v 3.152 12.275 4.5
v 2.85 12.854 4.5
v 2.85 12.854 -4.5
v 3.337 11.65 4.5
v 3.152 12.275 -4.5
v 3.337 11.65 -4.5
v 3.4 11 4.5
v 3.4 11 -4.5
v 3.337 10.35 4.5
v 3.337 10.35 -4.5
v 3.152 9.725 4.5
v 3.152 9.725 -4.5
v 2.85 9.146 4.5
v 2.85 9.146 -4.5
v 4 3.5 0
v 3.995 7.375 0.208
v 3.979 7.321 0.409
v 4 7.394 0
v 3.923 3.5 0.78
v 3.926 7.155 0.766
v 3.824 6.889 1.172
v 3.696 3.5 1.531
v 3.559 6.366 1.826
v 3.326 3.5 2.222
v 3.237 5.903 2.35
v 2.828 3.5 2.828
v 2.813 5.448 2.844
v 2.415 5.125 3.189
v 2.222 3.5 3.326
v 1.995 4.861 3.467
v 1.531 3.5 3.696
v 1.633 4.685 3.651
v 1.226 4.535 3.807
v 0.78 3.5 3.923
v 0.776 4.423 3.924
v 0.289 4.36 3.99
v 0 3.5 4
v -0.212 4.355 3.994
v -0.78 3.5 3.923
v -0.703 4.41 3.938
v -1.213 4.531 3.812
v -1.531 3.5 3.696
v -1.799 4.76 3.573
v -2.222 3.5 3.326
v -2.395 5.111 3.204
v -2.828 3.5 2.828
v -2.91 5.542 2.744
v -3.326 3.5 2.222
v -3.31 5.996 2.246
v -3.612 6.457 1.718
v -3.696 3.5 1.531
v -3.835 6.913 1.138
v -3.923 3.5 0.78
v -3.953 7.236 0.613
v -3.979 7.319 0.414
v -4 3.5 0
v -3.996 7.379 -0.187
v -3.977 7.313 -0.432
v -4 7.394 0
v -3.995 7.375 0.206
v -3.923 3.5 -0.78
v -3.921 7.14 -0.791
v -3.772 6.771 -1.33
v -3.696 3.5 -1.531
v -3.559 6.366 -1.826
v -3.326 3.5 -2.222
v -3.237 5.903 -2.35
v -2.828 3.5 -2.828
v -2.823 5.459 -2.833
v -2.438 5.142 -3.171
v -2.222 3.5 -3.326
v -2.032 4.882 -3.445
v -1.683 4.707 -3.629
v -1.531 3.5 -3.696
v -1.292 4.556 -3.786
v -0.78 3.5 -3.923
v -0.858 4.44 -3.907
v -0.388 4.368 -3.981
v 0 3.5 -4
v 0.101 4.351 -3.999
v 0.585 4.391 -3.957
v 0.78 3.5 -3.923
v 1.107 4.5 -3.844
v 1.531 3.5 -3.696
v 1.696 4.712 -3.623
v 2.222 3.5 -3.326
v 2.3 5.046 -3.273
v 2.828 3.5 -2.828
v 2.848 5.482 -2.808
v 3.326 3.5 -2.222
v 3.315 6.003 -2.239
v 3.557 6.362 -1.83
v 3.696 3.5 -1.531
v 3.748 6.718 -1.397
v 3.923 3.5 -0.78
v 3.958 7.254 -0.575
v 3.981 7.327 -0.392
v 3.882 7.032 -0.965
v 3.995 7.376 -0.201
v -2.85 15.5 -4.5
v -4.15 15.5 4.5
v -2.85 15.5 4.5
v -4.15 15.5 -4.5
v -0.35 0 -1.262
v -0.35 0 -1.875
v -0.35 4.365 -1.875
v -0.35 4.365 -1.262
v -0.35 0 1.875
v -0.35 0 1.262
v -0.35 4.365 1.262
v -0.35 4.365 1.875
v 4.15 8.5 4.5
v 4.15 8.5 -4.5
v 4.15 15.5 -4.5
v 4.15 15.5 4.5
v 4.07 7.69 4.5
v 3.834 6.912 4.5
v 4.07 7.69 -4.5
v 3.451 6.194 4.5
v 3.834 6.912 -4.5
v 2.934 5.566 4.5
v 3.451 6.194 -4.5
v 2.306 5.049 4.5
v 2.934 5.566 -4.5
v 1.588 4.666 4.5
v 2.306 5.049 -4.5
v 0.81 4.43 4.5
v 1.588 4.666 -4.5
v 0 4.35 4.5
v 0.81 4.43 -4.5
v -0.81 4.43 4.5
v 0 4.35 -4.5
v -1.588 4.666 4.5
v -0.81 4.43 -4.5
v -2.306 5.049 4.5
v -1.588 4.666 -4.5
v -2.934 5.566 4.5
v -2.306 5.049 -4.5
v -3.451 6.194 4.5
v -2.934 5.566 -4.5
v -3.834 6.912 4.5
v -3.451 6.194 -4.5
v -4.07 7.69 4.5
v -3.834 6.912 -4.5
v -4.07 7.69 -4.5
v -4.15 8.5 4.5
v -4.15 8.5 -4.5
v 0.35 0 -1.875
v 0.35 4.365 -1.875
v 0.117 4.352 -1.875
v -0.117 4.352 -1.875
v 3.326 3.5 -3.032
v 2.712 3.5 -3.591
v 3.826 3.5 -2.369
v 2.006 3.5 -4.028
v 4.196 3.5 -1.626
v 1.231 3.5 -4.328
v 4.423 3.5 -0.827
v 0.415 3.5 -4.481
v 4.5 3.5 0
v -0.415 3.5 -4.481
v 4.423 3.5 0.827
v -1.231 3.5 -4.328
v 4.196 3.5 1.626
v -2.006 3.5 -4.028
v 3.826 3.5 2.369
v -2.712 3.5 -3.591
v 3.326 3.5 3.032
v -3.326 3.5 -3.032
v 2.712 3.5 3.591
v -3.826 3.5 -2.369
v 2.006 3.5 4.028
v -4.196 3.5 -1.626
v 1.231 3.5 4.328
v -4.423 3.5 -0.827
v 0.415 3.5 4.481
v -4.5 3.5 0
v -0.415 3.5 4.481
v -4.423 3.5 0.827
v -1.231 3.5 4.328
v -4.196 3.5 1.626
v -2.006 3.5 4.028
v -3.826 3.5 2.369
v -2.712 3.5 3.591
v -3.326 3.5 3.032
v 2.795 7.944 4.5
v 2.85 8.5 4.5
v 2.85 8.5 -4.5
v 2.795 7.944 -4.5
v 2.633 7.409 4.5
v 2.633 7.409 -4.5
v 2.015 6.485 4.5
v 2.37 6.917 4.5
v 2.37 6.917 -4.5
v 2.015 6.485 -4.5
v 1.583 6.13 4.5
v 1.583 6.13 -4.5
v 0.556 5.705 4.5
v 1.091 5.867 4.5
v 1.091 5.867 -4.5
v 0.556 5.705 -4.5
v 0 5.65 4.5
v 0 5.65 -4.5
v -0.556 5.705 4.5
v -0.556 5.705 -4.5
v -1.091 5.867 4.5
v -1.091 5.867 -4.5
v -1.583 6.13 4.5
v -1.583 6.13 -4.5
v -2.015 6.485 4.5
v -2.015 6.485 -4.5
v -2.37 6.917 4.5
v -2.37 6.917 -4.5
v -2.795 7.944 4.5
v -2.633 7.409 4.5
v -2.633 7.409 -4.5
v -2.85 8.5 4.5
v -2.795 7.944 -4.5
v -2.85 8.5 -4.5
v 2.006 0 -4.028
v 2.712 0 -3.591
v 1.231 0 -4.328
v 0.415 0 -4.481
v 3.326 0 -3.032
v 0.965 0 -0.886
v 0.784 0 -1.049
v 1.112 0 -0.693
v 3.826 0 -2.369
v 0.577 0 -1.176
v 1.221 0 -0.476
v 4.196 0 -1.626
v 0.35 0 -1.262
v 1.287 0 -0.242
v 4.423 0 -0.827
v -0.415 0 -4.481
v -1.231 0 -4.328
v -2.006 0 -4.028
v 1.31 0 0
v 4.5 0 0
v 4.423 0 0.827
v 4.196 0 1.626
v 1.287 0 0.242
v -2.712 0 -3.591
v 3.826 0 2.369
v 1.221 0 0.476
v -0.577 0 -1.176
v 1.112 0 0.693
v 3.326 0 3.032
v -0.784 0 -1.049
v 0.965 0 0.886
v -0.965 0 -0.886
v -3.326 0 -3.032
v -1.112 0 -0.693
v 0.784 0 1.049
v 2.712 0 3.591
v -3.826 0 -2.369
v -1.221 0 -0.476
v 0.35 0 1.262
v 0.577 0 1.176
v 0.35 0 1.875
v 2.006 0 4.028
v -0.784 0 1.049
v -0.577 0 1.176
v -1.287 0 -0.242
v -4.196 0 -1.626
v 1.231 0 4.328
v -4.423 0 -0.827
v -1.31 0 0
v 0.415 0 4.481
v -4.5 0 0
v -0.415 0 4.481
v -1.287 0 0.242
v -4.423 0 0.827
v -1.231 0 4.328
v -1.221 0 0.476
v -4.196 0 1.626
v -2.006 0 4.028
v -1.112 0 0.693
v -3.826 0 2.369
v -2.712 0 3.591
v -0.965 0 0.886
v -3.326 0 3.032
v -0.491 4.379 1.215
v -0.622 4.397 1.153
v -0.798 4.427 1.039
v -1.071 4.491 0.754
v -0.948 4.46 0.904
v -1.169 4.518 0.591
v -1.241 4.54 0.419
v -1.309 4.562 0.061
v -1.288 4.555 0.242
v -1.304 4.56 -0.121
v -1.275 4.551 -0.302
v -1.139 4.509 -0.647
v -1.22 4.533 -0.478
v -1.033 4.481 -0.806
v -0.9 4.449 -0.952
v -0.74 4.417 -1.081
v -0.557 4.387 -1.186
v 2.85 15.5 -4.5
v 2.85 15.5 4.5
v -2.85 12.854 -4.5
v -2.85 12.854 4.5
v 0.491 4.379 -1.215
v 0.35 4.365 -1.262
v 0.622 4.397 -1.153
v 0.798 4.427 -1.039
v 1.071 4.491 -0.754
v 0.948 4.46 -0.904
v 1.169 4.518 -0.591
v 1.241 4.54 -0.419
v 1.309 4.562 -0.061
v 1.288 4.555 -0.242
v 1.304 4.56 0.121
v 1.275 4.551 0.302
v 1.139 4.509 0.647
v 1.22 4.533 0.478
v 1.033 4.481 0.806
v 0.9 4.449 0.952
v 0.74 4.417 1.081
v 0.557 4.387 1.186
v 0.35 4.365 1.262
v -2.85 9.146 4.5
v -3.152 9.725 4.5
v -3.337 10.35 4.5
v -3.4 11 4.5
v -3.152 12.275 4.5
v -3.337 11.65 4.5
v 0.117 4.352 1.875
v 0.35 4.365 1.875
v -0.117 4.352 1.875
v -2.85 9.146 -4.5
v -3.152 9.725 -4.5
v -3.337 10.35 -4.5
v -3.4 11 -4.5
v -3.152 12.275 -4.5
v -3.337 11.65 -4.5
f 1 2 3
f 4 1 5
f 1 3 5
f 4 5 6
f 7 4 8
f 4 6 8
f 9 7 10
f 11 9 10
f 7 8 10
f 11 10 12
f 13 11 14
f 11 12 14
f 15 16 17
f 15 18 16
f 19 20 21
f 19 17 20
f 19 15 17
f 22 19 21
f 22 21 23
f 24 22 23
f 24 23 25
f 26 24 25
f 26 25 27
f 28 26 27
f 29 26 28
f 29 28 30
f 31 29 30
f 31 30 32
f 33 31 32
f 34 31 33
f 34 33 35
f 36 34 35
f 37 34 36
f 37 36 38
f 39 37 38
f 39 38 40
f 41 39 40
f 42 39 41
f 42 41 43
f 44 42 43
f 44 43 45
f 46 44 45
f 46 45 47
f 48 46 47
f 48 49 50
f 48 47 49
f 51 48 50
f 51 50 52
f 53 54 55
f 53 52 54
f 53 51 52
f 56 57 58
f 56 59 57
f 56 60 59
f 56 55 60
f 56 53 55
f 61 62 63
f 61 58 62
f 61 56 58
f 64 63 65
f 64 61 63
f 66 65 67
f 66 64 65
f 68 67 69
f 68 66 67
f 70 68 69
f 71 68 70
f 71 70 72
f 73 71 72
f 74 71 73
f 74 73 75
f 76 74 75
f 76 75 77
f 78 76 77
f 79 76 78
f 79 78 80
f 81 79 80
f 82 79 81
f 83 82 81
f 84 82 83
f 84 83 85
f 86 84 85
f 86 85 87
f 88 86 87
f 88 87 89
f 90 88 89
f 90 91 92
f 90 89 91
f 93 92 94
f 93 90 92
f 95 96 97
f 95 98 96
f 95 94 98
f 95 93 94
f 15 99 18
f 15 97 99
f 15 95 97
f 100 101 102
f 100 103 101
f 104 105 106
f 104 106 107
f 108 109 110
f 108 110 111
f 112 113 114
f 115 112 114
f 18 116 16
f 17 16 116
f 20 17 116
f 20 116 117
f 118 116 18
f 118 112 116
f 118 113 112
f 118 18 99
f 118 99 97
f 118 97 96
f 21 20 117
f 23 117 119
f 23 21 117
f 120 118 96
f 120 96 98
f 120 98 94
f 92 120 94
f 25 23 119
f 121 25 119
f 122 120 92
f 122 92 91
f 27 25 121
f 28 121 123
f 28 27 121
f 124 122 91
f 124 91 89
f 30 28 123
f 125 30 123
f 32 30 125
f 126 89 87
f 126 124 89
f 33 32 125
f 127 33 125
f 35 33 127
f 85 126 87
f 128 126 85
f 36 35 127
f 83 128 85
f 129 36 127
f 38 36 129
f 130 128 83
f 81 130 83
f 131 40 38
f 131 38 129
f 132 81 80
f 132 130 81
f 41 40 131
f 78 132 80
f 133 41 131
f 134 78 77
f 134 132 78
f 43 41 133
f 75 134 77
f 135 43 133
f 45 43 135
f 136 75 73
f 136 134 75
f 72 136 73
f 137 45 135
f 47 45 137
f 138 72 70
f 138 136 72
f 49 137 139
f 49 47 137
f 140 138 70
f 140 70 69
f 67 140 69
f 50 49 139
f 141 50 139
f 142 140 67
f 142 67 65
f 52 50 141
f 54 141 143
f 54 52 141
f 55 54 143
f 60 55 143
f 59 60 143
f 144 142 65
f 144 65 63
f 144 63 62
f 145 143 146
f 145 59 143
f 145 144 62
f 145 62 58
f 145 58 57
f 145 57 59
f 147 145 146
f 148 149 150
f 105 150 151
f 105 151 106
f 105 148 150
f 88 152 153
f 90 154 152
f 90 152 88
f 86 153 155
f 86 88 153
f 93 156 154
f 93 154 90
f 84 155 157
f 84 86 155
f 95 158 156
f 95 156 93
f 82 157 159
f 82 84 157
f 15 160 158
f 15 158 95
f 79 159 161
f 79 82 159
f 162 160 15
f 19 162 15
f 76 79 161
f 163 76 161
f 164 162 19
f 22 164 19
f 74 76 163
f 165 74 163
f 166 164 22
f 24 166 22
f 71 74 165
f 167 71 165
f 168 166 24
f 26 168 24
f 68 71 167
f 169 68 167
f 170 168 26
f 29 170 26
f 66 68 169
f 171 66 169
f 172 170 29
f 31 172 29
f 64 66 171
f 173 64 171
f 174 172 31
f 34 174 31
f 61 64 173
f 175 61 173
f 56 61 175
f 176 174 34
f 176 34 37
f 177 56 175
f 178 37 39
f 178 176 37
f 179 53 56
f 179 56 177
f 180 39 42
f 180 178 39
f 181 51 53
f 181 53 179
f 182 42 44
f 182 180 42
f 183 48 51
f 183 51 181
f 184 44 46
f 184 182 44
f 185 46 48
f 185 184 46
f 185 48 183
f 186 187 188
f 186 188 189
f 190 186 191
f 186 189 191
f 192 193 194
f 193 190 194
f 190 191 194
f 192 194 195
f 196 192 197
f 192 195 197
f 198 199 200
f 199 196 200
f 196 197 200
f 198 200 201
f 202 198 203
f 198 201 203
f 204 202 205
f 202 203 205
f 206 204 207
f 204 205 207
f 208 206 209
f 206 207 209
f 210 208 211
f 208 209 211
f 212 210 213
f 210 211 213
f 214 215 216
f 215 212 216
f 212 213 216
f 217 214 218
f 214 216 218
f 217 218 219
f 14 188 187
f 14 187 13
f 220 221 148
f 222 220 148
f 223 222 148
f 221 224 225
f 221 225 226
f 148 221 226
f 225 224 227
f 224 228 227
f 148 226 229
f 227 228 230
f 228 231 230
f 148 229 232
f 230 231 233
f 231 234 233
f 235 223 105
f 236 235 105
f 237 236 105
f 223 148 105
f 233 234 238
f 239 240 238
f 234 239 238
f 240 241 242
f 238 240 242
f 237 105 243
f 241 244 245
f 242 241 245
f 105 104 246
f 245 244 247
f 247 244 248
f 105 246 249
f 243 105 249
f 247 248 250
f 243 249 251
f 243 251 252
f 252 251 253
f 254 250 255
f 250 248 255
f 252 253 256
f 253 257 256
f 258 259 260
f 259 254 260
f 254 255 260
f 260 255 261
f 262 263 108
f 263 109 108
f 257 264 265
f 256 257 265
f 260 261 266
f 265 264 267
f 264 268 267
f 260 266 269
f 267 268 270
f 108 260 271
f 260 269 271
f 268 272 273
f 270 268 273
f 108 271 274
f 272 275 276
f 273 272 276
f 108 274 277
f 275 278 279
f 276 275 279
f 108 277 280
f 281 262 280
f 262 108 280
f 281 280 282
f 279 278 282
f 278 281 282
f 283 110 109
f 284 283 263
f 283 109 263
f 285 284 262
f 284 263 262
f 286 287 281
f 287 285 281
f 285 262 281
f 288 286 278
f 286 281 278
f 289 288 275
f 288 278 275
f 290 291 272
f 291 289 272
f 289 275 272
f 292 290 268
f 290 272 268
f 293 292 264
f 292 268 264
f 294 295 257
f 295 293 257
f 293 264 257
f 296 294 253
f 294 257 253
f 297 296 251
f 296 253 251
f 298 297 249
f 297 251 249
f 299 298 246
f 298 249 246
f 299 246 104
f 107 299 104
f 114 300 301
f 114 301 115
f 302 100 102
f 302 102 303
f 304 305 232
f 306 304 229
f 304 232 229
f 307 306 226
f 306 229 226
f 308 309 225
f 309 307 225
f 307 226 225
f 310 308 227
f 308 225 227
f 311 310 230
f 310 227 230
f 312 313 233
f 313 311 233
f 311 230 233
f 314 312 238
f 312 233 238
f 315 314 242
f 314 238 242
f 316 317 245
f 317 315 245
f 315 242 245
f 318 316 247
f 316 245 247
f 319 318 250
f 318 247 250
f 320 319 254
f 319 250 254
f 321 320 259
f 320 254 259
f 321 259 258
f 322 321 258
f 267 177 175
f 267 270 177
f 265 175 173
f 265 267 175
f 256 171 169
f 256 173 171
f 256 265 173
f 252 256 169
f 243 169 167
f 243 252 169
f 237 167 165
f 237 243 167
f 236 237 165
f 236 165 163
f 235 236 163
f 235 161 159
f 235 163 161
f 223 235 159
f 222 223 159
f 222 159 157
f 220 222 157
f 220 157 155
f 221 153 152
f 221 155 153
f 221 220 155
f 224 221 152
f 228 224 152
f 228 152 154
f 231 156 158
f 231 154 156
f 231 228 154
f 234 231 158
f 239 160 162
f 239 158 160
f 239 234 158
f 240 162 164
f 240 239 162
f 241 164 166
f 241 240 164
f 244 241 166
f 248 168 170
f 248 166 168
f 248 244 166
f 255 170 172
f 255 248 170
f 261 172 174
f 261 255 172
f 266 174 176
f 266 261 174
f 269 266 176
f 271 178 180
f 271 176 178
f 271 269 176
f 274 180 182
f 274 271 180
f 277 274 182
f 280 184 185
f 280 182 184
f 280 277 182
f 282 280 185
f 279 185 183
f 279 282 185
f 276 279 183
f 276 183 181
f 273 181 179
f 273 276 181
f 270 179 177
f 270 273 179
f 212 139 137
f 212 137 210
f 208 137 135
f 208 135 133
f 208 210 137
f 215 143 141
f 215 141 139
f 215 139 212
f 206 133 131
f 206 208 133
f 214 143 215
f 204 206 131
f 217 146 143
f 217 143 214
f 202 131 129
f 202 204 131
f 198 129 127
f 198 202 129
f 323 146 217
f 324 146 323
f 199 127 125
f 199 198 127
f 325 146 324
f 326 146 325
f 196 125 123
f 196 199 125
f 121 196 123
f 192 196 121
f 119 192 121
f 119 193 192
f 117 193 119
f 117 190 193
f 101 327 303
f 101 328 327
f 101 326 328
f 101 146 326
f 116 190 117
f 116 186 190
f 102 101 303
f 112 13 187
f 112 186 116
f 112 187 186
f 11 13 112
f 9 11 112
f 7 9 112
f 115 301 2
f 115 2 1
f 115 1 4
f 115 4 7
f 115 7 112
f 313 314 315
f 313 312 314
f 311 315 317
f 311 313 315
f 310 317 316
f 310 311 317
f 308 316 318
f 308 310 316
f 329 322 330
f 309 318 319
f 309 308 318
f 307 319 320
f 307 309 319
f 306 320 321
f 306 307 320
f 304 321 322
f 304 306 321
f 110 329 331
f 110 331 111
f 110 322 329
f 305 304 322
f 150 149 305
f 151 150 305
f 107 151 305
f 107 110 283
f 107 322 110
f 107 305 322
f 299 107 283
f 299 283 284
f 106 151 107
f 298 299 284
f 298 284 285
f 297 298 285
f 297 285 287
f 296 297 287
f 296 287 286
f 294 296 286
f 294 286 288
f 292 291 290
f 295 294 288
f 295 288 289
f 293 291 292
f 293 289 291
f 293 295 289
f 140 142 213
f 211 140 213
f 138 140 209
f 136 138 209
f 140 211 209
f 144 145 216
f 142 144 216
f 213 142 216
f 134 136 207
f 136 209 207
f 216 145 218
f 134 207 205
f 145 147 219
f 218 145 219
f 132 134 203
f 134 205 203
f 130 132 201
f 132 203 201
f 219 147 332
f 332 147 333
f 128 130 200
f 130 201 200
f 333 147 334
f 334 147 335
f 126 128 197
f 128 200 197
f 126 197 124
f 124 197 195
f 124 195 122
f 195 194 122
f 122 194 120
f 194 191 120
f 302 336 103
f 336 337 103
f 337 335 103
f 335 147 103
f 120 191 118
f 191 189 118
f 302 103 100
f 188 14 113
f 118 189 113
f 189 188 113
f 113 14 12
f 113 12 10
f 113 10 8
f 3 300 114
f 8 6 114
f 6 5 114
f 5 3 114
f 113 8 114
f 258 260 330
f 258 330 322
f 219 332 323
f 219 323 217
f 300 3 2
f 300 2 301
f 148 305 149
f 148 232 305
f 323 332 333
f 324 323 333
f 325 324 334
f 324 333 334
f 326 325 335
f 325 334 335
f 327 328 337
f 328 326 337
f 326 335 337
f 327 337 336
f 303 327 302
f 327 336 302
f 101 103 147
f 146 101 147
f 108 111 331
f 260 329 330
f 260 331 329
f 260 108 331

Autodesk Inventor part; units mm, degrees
ref_plane "YZ Plane" through (0, 0, 0) normal (1, 0, 0) x (0, 1, 0)
ref_plane "XZ Plane" through (0, 0, 0) normal (0, 1, 0) x (-1, 0, 0)
ref_plane "XY Plane" through (0, 0, 0) normal (0, 0, 1) x (1, 0, 0)
sketch "Sketch1" plane through (0, 0, 0) normal (0, 1, 0) x (-1, 0, 0)
  circle A0 centre (0, 0) radius 1.05 construction
  arc A1 (-0.35, 1.2624) -> (-0.35, -1.2624) centre (0, 0) ccw
  circle A2 centre (0, 0) radius 4.5
  line L0 (0.35, 1.875) -> (-0.35, 1.875)
  line L1 (-0.35, 1.875) -> (-0.35, -1.875)
  line L2 (-0.35, -1.875) -> (0.35, -1.875)
  line L3 (0.35, -1.875) -> (0.35, 1.875)
  arc A3 (0.35, 1.2624) -> (-0.35, 1.2624) centre (0, 0) ccw
  arc A4 (0.35, -1.2624) -> (0.35, 1.2624) centre (0, 0) ccw
  arc A5 (-0.35, -1.2624) -> (0.35, -1.2624) centre (0, 0) ccw
  point P0 (0, 1.875)
  point P1 (0.35, 0)
  dimension "d1" = 2.1
  dimension "d3" = 9
  dimension "d18" = 0.26
  dimension "d19" = 0.7
  dimension "d20" = 3.75
extrude "Extrusion1" add sketch "Sketch1" along normal blind 3.5
sketch "Sketch4" plane through (0, 0, 0) normal (0, 0, 1) x (1, 0, 0)
  line L0 (-4.15, 15.5) -> (-4.15, 8.5)
  arc A0 (-4.15, 8.5) -> (4.15, 8.5) centre (0, 8.5) ccw
  line L1 (4.15, 8.5) -> (4.15, 15.5)
  line L2 (-2.85, 15.5) -> (-2.85, 12.854)
  arc A1 (-2.85, 8.5) -> (2.85, 8.5) centre (0, 8.5) ccw
  line L3 (2.85, 8.5) -> (2.85, 9.146)
  line L4 (-4.15, 15.5) -> (-2.85, 15.5)
  line L5 (2.85, 15.5) -> (4.15, 15.5)
  line L6 (-0.35, 0) -> (0.35, 0) projected
  line L7 (4.5, 3.5) -> (-4.5, 3.5) projected
  circle A2 centre (0, 11) radius 3.4
  line L8 (-2.85, 12.854) -> (-2.85, 9.146)
  line L9 (-2.85, 9.146) -> (-2.85, 8.5)
  line L10 (2.85, 9.146) -> (2.85, 12.854)
  line L11 (2.85, 12.854) -> (2.85, 15.5)
  point P0 (0, 0)
  point P1 (0, 0)
  dimension "d21" = 2.85
  dimension "d23" = 1.3
  dimension "d24" = 5
  dimension "d25" = 7
  dimension "d26" = 6.8
  dimension "d27" = 2.5
extrude "Extrusion5" add sketch "Sketch4" along normal mid plane 9 contours L4 L2 A2 L9 A1 L3 L11 L5 L1 A0 L0
sketch "Sketch8" plane through (0, 3.5, 0) normal (0, 1, 0) x (1, 0, 0)
  circle A0 centre (0, 0) radius 4
  arc A1 (0.35, -1.2624) -> (0.35, 1.2624) centre (0, 0) ccw projected
  line L0 (0.35, 1.875) -> (0.35, 1.2624) projected
  line L1 (-0.35, 1.875) -> (0.35, 1.875) projected
  line L2 (-0.35, 1.2624) -> (-0.35, 1.875) projected
  arc A2 (-0.35, 1.2624) -> (-0.35, -1.2624) centre (0, 0) ccw projected
  line L3 (-0.35, -1.875) -> (-0.35, -1.2624) projected
  line L4 (0.35, -1.875) -> (-0.35, -1.875) projected
  line L5 (0.35, -1.2624) -> (0.35, -1.875) projected
  dimension "d33" = 8
extrude "Extrusion6" add sketch "Sketch8" along normal up to next
sketch "Sketch2" plane through (0, 3.5, 0) normal (0, 1, 0) x (1, 0, 0)
  circle A0 centre (0, 0) radius 1.31 projected
  circle A1 centre (0, 0) radius 3.31
  dimension "d6" = 2
  dimension "d9" = 7.3
  dimension "d10" = 2
properties part number "Laser Mount" material "ABS Plastic"
